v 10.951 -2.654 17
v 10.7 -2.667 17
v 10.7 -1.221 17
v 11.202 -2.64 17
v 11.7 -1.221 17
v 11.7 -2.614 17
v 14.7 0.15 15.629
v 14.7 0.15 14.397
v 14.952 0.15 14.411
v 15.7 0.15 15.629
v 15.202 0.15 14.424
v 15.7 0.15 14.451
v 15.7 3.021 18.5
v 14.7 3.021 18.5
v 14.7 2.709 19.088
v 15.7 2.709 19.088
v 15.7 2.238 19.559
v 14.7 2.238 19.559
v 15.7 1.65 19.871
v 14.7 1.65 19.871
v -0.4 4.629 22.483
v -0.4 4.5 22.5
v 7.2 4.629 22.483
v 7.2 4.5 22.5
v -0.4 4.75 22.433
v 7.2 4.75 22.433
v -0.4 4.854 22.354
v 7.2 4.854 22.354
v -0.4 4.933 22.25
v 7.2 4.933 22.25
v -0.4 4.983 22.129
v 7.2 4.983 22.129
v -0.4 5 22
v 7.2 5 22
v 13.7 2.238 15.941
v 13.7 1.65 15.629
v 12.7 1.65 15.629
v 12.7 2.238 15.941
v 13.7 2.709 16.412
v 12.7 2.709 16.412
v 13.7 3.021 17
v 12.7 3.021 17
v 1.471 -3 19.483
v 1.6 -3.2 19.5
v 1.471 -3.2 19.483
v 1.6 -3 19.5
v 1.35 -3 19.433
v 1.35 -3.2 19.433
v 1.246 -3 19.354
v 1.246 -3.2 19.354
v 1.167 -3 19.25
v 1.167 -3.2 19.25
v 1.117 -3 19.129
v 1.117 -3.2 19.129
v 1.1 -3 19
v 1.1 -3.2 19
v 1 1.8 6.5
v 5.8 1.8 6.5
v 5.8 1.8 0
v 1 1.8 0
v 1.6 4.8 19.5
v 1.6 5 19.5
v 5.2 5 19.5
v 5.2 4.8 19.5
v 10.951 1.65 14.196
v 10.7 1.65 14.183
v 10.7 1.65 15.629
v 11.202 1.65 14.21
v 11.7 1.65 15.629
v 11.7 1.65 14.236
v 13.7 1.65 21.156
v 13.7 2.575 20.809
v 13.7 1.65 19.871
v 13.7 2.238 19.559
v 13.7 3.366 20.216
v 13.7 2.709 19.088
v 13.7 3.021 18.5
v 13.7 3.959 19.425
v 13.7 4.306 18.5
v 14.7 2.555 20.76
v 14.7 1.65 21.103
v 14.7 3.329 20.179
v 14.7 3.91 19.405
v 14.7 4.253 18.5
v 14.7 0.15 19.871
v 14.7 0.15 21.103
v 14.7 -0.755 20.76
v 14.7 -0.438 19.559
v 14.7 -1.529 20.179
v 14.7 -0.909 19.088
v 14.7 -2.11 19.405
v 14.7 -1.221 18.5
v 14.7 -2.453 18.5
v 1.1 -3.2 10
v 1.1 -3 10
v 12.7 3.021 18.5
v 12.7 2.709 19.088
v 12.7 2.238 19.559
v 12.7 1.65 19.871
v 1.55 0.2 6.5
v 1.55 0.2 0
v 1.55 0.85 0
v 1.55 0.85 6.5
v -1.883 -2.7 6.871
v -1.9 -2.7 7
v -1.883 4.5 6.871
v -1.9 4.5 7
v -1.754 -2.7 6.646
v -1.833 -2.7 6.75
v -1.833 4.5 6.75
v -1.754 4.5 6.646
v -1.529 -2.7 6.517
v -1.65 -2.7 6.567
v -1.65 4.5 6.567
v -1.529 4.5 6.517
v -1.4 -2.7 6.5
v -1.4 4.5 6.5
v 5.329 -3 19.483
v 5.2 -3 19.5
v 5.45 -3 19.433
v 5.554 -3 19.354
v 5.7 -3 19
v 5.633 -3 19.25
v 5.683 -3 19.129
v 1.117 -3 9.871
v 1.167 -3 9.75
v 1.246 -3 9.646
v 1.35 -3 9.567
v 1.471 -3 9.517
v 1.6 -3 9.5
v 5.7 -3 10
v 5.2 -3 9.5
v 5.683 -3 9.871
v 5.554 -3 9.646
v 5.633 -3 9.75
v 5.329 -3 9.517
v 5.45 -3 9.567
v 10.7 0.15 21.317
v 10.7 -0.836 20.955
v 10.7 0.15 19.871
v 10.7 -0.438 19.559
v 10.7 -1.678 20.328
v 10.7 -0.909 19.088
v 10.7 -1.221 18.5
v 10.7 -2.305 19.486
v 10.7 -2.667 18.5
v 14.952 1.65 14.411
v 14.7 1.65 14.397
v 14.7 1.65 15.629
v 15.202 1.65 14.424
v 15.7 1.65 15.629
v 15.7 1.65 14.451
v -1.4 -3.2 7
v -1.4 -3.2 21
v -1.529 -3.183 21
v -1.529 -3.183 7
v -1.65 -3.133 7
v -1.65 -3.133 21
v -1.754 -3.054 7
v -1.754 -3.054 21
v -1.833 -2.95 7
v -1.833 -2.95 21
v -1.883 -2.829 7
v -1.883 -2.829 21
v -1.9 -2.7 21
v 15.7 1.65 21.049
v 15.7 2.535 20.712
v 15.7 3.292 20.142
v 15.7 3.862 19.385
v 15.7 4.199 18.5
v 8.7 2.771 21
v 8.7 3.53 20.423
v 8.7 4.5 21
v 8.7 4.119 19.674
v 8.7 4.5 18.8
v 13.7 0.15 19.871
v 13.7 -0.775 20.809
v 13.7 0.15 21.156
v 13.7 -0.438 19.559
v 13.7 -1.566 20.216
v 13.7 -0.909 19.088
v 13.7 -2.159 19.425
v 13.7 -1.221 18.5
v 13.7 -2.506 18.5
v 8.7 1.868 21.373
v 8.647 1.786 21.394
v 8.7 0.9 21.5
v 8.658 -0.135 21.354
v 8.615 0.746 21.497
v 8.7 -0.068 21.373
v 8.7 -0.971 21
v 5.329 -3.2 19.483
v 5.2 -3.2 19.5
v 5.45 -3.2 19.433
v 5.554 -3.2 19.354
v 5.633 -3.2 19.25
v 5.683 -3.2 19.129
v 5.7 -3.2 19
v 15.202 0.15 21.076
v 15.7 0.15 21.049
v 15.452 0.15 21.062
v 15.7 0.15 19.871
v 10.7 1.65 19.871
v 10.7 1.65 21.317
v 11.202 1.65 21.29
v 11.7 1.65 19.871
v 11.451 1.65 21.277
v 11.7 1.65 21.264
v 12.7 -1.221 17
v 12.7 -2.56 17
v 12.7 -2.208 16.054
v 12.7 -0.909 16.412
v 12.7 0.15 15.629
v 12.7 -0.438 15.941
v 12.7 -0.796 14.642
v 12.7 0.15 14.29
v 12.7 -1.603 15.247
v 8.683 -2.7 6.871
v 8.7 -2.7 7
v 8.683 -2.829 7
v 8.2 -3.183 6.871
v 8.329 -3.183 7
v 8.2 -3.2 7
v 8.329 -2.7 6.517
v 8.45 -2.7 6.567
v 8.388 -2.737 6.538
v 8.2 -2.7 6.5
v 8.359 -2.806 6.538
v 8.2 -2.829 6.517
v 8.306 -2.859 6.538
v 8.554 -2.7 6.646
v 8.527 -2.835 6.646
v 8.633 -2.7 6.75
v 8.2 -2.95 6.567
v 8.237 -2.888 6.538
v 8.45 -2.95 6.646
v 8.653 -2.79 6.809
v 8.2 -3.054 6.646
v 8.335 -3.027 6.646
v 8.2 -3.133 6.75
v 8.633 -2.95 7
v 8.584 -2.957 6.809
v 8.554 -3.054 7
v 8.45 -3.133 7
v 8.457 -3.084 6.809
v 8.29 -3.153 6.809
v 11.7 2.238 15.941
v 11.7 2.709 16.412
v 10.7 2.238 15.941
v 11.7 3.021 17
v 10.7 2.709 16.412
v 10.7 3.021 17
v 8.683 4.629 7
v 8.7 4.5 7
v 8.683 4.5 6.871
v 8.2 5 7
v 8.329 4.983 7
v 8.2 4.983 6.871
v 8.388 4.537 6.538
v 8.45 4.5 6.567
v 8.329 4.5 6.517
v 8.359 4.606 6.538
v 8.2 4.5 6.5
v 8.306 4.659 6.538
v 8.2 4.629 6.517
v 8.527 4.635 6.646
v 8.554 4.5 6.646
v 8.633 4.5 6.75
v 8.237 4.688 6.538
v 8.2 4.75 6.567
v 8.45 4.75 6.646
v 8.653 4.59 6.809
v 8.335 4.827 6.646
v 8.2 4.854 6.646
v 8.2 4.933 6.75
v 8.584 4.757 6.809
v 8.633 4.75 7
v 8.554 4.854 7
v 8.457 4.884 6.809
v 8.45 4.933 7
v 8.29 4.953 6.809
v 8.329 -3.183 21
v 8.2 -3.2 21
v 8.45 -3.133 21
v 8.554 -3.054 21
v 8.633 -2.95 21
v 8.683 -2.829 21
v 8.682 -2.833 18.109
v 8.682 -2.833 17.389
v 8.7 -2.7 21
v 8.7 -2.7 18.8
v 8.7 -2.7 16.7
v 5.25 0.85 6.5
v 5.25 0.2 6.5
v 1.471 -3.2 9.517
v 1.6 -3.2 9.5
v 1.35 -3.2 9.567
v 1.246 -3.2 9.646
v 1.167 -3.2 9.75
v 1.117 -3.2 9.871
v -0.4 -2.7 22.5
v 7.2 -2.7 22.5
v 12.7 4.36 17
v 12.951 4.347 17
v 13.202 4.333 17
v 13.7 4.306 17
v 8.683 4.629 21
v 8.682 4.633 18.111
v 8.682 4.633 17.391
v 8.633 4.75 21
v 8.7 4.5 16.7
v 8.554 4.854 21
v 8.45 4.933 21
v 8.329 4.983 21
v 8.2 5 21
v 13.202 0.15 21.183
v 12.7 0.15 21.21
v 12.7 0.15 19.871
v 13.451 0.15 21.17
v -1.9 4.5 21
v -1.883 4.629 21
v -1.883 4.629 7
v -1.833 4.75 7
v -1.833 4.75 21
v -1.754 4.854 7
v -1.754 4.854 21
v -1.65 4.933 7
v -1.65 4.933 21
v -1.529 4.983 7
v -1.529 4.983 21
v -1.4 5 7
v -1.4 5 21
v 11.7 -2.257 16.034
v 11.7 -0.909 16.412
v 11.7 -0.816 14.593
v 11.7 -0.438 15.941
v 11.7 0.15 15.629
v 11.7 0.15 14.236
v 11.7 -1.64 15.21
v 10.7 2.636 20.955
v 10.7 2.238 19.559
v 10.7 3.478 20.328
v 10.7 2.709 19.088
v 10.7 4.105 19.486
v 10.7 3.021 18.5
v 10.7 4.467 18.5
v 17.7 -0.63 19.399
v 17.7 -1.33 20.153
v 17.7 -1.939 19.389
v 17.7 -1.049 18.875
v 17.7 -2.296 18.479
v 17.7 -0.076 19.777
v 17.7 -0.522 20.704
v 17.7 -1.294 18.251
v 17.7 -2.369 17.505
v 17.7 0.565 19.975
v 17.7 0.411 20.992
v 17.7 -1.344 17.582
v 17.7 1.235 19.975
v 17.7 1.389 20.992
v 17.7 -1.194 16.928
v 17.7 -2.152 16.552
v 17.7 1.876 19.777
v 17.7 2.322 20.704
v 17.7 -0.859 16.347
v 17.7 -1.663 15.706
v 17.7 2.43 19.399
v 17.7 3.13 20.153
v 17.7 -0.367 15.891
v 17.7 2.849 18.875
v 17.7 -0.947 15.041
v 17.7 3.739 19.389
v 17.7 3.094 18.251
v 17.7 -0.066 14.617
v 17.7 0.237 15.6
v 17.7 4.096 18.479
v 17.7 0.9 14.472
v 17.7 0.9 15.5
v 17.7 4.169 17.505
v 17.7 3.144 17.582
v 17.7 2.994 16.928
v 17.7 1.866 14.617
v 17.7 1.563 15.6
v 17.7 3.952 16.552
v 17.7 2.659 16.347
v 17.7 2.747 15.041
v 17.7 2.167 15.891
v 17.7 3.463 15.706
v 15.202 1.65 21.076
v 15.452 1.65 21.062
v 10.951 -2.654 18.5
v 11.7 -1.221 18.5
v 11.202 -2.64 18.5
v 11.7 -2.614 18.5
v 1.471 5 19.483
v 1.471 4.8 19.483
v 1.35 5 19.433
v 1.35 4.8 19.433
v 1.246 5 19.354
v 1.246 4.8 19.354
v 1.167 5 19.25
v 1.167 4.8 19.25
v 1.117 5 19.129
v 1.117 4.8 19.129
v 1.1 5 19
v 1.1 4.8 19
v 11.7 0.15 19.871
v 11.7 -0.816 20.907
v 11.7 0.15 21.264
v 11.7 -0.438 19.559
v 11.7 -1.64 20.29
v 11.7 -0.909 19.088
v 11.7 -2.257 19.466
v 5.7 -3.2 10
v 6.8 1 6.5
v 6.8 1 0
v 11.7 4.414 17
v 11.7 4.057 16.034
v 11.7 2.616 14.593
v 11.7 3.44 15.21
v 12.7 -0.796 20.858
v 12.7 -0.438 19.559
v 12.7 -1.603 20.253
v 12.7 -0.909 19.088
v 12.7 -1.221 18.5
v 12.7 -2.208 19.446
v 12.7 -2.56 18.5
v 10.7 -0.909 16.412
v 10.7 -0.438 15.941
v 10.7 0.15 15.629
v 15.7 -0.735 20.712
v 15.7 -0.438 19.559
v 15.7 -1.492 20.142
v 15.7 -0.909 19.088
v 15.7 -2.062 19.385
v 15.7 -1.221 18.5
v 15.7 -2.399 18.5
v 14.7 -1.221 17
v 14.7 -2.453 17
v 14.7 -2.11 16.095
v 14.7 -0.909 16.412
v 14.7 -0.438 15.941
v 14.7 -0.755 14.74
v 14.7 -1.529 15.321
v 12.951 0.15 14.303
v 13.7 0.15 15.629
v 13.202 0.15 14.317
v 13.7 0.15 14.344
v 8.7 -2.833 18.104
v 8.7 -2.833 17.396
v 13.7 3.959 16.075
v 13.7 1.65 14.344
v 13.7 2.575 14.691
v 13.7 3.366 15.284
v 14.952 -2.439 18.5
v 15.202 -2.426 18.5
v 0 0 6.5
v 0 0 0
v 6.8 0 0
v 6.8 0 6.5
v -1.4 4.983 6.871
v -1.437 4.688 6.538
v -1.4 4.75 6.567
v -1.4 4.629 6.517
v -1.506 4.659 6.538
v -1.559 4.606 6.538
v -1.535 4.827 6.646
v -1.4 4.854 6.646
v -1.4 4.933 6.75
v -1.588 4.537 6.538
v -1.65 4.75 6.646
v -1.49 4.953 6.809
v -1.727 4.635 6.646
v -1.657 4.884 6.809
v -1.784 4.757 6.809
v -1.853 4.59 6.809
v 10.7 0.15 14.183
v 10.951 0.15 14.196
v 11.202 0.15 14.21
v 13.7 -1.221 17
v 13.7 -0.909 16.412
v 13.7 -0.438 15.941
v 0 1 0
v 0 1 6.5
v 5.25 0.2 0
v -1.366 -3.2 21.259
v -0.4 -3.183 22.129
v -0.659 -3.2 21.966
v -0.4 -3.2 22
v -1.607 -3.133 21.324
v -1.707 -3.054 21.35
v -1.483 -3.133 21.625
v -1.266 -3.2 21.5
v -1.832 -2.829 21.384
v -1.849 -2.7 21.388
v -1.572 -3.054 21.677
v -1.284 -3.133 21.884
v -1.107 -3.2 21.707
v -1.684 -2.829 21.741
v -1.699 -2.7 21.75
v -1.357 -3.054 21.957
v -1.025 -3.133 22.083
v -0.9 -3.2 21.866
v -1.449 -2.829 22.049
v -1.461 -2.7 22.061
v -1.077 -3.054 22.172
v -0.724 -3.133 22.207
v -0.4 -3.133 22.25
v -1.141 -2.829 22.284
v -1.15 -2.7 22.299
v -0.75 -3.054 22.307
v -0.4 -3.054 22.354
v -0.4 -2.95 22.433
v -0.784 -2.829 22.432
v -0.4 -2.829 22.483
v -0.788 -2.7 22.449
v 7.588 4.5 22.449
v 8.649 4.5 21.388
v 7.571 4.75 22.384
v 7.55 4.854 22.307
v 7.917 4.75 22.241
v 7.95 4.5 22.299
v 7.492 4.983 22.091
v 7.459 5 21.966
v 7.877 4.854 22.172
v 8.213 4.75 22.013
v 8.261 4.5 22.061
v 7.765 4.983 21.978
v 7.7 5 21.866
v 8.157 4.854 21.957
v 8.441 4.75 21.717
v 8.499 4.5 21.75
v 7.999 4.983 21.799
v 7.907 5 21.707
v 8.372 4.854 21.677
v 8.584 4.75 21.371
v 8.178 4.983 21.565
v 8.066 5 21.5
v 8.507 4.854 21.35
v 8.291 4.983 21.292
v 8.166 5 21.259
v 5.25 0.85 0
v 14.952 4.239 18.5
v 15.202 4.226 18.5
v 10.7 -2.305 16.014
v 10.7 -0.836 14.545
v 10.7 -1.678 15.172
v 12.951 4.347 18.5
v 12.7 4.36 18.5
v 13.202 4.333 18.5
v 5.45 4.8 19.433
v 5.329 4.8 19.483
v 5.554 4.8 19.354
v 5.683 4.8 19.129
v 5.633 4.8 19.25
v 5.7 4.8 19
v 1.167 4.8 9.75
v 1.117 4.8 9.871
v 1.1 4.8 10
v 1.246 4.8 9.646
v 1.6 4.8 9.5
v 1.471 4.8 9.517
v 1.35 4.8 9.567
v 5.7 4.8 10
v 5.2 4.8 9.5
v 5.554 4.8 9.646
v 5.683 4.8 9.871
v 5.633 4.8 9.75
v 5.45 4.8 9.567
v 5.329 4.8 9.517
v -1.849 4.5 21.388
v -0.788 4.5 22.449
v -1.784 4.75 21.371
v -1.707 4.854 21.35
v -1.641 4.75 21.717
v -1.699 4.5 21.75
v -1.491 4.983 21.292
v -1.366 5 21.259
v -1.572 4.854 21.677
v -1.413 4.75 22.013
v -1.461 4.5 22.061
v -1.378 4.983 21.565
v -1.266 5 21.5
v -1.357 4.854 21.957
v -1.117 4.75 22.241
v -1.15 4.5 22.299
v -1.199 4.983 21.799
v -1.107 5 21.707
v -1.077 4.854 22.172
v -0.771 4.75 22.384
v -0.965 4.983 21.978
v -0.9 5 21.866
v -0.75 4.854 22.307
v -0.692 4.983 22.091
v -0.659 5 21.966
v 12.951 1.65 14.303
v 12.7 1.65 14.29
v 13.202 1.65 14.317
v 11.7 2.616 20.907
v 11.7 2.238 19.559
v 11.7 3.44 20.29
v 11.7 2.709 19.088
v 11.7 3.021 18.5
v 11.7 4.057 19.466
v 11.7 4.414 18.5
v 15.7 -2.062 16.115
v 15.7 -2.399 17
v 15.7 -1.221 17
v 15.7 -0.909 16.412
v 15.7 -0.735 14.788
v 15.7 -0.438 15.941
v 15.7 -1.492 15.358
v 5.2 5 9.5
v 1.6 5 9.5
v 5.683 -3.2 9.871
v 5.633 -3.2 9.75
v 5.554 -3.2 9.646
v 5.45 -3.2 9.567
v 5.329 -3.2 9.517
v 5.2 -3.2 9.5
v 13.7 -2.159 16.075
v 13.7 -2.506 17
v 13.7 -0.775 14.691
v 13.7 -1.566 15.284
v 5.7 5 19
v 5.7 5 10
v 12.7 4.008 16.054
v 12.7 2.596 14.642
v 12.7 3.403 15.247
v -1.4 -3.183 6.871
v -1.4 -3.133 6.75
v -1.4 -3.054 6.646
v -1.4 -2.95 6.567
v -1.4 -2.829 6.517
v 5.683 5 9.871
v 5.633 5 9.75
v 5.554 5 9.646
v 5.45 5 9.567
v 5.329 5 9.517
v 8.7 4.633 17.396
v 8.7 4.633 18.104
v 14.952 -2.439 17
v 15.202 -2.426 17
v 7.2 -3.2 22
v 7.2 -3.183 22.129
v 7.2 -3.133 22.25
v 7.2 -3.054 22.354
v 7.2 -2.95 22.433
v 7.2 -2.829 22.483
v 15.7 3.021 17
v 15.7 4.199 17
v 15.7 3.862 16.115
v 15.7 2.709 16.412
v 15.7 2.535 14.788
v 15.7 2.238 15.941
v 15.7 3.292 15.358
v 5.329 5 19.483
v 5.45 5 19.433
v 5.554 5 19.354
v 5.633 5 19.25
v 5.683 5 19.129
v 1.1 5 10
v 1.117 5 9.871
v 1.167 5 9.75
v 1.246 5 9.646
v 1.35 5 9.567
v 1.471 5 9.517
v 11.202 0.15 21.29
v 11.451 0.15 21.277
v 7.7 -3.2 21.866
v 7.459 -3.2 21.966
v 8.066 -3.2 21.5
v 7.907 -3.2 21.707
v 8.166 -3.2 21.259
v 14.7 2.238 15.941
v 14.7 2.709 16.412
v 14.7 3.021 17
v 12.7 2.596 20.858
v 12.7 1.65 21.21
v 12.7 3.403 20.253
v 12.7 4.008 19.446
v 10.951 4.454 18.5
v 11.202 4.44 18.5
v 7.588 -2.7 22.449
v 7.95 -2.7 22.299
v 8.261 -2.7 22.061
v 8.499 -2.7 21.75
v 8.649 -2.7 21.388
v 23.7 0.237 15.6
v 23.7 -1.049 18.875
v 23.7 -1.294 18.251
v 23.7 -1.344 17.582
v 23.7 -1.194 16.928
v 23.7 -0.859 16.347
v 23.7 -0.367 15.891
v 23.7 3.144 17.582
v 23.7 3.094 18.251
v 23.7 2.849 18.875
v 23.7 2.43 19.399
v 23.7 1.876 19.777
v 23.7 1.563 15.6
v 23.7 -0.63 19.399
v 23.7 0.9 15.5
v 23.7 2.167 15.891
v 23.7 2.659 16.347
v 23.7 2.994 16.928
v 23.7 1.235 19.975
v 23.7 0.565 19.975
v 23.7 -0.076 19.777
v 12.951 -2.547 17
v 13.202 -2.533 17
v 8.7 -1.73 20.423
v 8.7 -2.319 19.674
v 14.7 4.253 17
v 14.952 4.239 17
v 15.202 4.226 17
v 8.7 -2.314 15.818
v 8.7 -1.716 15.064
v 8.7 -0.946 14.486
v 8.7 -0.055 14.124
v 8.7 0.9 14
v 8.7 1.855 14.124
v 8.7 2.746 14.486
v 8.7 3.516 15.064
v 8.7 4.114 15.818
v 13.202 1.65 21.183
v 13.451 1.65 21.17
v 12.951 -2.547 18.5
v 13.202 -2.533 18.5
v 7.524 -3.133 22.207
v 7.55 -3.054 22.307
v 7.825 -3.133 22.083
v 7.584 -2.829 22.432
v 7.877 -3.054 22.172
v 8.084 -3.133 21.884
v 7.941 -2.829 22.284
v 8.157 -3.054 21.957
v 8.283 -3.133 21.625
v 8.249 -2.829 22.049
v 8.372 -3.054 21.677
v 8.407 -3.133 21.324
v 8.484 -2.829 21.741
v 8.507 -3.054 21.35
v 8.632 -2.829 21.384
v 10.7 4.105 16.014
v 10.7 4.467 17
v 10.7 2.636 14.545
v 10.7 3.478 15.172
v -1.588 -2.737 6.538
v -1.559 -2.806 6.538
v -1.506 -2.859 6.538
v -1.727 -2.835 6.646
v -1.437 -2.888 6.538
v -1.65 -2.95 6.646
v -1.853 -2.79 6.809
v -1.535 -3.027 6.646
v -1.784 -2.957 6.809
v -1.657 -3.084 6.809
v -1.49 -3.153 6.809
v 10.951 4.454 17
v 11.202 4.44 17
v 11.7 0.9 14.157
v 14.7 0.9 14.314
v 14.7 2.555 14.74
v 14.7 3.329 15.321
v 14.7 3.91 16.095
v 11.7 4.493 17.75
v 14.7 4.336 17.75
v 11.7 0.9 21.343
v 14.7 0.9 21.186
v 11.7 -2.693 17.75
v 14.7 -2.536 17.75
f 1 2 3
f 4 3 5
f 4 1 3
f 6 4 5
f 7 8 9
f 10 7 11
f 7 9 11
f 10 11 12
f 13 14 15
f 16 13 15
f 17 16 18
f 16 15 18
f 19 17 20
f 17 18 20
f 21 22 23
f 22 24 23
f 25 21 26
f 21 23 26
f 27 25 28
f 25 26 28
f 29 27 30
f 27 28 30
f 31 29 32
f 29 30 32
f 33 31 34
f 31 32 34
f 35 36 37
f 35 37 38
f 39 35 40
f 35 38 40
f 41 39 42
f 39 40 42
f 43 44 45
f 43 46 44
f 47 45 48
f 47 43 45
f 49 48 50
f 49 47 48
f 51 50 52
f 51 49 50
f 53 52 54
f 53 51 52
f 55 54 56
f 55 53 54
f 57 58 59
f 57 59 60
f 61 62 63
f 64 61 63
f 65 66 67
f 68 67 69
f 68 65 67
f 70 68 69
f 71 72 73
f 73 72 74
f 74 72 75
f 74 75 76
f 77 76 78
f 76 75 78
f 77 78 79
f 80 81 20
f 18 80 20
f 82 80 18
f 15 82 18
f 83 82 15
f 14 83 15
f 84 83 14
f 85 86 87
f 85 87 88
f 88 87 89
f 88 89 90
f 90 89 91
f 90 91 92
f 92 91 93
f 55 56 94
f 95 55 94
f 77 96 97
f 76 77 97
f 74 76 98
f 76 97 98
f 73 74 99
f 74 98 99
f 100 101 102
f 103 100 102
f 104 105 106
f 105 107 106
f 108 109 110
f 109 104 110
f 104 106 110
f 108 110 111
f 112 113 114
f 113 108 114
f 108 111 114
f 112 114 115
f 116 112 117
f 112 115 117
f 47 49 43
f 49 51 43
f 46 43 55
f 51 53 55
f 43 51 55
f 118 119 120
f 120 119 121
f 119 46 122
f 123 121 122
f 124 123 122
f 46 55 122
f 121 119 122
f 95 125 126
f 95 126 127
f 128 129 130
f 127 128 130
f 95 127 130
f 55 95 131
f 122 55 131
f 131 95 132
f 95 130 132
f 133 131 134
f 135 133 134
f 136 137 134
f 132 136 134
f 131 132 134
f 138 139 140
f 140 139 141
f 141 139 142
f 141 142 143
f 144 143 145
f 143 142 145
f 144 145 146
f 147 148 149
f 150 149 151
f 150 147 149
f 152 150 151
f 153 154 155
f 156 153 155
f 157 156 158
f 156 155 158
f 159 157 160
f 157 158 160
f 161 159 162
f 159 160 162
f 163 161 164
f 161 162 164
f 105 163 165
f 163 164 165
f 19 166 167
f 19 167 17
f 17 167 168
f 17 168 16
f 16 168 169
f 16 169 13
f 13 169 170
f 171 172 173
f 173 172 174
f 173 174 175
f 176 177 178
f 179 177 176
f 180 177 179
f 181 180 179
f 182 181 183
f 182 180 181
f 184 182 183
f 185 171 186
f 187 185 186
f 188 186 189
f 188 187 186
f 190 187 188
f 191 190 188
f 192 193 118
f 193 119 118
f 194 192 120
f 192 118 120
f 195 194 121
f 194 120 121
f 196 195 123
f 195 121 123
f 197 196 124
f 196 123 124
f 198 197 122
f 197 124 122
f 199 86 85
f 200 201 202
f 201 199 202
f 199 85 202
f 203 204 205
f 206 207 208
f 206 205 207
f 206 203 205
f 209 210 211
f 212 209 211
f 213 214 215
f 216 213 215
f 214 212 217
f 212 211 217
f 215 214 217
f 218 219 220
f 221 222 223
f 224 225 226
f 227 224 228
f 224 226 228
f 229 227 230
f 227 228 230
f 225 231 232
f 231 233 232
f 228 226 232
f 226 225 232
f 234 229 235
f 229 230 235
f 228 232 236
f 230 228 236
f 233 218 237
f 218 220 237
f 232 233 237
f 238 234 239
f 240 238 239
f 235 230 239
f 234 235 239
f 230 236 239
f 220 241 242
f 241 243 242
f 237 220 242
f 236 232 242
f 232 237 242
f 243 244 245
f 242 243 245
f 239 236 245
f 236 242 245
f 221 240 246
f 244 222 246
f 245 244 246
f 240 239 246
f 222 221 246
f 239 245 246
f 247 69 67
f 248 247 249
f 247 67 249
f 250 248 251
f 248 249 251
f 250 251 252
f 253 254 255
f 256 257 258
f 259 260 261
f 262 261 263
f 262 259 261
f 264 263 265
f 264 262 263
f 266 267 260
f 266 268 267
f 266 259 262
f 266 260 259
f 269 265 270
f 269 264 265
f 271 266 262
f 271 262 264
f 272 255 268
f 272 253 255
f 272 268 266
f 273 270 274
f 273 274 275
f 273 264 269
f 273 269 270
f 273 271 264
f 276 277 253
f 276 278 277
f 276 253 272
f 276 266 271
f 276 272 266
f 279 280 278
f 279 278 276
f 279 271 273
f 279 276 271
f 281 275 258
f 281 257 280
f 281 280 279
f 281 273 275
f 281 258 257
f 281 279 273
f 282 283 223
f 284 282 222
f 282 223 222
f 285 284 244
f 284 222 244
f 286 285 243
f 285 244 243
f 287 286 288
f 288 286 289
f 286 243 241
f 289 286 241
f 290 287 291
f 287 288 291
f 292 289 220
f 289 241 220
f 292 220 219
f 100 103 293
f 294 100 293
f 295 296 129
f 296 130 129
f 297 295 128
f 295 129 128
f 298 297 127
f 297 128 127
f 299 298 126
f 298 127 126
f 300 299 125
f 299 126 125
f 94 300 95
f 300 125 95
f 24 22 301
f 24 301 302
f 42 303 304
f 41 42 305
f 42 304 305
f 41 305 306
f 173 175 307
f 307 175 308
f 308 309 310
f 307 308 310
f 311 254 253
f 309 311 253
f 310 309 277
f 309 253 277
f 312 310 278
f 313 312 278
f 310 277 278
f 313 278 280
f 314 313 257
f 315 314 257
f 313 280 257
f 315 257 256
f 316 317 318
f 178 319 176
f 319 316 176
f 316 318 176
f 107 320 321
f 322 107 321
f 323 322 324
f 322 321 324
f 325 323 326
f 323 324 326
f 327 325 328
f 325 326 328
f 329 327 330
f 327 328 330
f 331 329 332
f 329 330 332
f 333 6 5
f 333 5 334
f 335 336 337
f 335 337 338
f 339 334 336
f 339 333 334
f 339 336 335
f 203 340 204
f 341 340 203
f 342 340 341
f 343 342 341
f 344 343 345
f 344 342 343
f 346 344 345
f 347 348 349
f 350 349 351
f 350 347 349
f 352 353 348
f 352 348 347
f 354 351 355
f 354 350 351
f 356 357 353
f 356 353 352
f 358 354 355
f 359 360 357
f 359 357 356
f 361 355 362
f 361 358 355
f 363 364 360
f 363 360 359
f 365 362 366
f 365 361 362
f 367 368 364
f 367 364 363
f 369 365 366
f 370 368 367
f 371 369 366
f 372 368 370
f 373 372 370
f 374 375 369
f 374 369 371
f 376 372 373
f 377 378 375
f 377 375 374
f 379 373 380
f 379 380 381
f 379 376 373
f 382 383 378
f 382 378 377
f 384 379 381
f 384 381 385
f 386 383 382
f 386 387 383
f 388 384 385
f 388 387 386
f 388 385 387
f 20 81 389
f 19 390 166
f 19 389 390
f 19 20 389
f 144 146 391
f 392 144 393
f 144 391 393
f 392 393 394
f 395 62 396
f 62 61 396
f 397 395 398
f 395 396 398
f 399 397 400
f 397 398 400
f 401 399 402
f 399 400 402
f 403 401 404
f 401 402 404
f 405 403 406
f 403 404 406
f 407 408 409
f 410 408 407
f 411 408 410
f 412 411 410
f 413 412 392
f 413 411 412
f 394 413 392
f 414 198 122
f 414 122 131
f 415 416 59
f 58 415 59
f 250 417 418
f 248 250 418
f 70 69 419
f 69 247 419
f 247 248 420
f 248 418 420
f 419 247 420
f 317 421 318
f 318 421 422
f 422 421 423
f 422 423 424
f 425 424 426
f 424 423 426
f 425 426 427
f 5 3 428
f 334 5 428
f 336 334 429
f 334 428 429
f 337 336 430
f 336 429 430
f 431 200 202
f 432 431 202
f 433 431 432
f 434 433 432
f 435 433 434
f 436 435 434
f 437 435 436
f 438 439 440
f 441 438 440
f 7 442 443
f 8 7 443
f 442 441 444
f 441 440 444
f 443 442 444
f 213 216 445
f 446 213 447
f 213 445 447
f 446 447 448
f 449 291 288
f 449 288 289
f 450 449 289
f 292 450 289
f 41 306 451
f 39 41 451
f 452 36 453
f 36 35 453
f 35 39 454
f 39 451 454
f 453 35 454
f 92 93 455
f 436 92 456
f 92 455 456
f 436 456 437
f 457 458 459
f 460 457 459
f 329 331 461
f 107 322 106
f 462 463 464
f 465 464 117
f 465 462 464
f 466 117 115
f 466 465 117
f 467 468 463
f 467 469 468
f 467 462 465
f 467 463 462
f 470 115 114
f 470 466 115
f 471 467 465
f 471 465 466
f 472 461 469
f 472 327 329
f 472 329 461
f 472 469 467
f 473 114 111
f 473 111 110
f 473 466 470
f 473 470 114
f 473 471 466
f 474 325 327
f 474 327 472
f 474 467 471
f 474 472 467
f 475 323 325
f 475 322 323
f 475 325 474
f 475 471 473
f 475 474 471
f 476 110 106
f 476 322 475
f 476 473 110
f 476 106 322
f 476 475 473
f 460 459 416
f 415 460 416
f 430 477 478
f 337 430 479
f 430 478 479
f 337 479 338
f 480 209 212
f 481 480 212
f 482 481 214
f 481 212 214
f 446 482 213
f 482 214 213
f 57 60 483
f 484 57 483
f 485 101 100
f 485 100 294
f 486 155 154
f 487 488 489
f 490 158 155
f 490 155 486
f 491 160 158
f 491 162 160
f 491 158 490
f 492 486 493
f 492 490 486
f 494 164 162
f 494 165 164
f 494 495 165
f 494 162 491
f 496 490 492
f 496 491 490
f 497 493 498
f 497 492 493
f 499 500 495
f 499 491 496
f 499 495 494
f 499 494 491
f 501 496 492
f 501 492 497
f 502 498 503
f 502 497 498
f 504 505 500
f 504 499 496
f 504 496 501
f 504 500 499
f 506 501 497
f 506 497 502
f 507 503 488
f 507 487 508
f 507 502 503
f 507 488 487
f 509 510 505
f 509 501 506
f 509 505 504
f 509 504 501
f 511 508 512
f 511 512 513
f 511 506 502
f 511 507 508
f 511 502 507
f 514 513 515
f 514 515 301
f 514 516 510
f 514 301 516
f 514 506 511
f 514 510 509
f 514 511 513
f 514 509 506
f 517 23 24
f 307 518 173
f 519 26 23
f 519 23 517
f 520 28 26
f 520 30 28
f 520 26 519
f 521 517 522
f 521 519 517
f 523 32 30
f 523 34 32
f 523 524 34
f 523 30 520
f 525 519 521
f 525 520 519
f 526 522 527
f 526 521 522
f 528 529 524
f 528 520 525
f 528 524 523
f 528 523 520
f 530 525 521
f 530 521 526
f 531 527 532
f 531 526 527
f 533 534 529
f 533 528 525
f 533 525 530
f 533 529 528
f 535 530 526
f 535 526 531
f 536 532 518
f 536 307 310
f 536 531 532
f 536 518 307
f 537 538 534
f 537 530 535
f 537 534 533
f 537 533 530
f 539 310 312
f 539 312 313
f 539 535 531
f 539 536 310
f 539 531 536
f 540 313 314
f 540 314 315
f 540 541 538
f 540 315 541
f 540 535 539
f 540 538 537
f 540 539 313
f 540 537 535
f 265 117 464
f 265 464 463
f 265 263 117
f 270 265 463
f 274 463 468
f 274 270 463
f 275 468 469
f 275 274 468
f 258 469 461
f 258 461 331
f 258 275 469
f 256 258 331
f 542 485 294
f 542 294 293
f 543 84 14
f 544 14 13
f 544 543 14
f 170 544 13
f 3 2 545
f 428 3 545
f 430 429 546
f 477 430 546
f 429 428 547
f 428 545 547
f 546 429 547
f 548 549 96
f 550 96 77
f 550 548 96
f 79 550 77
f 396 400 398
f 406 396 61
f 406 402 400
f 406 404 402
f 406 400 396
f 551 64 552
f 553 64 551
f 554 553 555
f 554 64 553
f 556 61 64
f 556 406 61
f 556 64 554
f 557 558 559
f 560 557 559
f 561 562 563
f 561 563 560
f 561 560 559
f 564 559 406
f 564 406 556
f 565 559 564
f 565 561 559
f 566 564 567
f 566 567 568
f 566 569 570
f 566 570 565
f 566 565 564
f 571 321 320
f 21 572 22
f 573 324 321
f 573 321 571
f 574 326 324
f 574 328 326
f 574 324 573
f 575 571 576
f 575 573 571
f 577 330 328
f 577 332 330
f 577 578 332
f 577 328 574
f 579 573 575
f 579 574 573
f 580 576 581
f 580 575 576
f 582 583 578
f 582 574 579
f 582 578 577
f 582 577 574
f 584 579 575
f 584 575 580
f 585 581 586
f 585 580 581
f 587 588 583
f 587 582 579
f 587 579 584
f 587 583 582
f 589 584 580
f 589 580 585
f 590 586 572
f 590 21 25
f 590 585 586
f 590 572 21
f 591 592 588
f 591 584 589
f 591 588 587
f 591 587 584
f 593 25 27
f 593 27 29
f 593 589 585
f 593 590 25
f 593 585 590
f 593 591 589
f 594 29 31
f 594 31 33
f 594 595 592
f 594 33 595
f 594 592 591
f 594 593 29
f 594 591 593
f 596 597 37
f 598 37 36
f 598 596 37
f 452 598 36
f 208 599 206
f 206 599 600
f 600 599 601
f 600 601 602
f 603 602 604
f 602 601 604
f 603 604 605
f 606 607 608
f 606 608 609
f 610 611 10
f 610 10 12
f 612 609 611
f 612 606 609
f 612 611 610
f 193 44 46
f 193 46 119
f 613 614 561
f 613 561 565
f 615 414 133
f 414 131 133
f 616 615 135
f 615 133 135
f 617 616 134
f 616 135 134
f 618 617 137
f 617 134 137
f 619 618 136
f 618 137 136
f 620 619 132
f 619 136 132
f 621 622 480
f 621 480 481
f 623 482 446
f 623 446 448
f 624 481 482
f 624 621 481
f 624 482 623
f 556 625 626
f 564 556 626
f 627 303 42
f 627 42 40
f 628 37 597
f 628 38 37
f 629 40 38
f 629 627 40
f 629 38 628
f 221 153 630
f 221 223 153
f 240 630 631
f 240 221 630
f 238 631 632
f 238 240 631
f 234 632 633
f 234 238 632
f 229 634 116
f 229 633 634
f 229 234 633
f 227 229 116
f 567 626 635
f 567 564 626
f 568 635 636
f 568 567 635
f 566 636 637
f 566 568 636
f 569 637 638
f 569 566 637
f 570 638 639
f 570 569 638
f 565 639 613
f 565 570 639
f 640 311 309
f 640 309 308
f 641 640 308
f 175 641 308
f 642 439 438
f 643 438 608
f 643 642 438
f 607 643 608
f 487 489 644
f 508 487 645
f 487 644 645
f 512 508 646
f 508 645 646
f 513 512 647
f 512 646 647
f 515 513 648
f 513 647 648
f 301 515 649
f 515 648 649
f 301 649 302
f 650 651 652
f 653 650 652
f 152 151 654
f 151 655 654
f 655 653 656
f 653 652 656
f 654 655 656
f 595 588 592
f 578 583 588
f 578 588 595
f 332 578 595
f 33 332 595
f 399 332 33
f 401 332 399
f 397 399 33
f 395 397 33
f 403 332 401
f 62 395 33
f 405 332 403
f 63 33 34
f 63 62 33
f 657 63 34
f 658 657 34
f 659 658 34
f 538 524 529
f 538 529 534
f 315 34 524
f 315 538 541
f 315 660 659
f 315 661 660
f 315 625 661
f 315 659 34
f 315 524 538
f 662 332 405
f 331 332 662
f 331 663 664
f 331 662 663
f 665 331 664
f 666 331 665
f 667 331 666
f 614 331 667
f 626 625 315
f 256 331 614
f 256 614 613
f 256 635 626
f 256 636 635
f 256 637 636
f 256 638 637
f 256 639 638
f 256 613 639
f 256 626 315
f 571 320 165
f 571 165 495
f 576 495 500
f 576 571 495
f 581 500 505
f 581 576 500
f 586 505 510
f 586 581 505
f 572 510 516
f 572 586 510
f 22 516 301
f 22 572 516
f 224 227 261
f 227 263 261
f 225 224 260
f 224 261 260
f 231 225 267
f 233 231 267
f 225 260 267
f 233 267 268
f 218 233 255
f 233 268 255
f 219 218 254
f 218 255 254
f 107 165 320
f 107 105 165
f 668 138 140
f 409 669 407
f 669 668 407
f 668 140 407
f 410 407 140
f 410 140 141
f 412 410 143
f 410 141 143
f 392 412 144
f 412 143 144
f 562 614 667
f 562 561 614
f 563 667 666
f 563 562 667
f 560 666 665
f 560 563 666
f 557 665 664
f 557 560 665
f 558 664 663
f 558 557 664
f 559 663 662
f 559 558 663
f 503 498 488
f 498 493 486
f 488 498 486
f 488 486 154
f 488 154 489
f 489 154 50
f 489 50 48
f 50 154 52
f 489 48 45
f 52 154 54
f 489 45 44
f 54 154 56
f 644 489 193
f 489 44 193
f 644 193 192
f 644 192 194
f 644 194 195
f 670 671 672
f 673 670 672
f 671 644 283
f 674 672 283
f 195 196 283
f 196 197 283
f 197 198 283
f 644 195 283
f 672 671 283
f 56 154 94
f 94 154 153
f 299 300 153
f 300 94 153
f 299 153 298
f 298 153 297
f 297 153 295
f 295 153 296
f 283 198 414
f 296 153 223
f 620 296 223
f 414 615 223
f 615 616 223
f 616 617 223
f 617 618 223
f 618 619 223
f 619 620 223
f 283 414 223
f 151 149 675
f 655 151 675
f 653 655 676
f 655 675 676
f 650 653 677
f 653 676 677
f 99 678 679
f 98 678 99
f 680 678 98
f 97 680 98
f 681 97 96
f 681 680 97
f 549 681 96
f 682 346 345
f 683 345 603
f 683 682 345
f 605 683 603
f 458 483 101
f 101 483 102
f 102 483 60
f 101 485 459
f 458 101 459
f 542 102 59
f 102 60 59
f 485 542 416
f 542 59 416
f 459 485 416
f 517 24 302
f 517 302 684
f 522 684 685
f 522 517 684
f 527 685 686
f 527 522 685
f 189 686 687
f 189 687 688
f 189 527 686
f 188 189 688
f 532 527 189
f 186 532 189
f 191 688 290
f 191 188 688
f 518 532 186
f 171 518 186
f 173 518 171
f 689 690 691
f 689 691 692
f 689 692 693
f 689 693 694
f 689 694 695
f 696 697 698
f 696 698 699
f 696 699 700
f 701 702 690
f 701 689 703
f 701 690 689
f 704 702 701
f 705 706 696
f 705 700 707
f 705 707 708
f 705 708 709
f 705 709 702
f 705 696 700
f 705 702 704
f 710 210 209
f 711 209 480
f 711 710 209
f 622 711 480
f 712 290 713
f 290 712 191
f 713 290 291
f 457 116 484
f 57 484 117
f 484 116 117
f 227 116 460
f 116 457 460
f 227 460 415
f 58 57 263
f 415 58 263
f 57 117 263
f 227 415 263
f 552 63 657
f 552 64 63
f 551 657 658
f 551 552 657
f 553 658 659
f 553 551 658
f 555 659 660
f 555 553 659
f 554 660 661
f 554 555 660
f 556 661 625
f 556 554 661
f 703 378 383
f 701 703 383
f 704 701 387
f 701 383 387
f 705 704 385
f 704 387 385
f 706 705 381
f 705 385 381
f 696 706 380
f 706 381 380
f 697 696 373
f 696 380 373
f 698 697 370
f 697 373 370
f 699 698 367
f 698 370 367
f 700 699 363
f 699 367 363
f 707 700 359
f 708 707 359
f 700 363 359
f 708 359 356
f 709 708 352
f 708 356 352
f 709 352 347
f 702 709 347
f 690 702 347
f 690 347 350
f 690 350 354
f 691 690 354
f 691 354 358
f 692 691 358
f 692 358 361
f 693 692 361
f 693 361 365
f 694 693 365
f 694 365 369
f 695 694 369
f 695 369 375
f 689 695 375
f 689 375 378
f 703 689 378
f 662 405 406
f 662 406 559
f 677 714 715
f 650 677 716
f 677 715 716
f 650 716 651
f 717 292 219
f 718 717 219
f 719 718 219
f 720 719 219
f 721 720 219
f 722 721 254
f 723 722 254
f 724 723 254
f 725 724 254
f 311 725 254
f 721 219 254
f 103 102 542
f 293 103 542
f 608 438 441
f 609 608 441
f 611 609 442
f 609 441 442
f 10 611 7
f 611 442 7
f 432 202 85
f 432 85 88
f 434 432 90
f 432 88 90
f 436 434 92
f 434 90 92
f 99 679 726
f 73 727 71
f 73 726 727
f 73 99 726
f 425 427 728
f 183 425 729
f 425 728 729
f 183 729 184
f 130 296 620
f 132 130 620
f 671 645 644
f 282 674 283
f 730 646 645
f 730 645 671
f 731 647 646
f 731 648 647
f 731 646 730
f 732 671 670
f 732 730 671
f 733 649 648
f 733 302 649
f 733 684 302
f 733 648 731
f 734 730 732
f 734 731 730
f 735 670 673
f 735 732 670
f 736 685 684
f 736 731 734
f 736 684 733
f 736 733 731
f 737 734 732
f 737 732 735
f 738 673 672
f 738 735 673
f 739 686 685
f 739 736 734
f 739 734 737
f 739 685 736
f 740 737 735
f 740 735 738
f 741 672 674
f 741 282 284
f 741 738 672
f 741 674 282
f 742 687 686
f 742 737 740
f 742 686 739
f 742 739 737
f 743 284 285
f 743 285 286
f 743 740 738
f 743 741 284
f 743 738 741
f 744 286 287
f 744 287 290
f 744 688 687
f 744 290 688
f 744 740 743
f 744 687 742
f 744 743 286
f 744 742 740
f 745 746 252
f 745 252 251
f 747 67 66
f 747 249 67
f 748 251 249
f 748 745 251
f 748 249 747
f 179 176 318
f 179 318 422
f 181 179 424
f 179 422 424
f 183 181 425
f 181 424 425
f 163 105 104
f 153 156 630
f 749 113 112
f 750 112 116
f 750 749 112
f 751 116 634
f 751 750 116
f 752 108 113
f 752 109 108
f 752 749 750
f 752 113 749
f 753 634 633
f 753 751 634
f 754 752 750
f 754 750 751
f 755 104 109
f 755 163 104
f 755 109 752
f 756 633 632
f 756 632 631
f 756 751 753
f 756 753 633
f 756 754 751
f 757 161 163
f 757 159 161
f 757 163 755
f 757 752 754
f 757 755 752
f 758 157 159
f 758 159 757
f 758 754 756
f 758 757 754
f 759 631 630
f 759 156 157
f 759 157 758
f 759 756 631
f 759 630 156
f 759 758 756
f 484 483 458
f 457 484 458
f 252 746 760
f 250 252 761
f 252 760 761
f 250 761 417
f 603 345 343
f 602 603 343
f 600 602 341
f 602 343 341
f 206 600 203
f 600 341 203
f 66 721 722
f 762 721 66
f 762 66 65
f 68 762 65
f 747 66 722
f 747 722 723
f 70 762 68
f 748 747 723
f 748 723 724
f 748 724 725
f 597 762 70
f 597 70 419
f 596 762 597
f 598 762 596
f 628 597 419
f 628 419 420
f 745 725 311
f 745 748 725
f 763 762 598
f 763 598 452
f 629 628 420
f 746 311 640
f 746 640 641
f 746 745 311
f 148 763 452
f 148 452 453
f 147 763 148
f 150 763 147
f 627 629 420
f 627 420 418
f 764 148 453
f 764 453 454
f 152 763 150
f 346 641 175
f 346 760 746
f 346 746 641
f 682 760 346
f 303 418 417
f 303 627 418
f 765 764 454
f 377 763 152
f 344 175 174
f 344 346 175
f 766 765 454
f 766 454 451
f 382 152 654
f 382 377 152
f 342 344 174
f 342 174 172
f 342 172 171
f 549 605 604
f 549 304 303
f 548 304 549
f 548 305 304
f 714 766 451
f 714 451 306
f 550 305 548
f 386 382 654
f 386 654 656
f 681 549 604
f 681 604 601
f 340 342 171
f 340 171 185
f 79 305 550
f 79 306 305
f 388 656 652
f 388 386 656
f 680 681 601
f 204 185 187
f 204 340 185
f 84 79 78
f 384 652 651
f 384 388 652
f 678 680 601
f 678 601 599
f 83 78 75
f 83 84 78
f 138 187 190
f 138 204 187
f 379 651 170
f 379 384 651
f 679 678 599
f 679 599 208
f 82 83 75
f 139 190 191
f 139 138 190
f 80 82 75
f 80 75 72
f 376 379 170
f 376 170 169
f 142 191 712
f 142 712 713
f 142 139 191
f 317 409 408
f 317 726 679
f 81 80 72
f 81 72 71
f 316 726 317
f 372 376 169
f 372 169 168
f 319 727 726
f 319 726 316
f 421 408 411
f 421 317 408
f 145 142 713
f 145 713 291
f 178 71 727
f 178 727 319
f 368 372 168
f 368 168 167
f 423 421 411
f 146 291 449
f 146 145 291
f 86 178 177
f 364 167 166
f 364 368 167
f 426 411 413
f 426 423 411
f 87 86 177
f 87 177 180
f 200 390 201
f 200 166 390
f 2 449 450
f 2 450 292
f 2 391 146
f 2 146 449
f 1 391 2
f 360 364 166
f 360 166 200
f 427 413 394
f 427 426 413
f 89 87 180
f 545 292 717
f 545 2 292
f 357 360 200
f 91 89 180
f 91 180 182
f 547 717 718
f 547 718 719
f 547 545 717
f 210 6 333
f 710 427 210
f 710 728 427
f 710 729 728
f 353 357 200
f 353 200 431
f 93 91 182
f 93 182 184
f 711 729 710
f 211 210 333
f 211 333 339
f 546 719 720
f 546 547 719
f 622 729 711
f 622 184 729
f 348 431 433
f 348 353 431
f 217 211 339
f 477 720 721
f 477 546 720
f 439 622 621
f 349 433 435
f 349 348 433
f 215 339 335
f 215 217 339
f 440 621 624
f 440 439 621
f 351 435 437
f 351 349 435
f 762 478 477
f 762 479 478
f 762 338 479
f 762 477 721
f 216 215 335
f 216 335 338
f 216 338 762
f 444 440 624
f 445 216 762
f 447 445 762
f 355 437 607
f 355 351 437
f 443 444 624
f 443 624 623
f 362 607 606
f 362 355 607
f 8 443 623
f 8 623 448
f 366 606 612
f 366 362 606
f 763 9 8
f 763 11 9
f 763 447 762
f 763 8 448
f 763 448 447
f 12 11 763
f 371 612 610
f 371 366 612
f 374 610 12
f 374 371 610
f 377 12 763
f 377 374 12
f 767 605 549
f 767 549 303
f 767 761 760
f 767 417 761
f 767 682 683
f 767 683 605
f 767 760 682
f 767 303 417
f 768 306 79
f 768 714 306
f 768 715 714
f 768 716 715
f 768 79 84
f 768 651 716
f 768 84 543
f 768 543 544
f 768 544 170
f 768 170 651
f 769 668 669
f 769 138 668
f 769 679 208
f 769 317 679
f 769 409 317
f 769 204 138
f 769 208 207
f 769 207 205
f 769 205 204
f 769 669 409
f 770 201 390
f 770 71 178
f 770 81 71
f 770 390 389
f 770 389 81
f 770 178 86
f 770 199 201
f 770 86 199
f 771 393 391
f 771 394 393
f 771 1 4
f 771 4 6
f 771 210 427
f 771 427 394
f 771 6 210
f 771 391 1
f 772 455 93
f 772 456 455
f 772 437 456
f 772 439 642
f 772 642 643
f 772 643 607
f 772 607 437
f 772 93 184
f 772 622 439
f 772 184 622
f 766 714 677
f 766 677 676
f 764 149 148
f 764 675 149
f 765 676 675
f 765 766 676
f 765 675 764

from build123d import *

# Parameters (mm, degrees)
SKETCH1_W                     = 3.7
SKETCH1_H                     = 0.65
BOSS_EXTRUDE1_DEPTH           = 6.5
SKETCH2_W                     = 10.6
SKETCH2_H                     = 8.2
BOSS_EXTRUDE2_DEPTH           = 16
SKETCH6_W                     = 4.6
SKETCH6_H                     = 10
CUT_EXTRUDE2_DEPTH            = 0.2
FILLET3_R                     = 0.5
FILLET3_OF_MIRROR2_R          = 0.5
FILLET1_R                     = 1.5
FILLET2_R                     = 0.5
SKETCH3_R                     = 3.75
BOSS_EXTRUDE3_DEPTH           = 9
BOSS_EXTRUDE3_TAPER           = 3
BOSS_EXTRUDE3_OTHER_WAY_DEPTH = 8.7
SKETCH5_W                     = 1
SKETCH5_H                     = 2.895184441
CUT_EXTRUDE1_DEPTH            = 3.35
SKETCH4_R                     = 2.25
BOSS_EXTRUDE4_DEPTH           = 15


with BuildPart() as part:
    # Sketch1 → Boss-Extrude1 (new body)
    with BuildSketch(Plane.XY):
        Polygon((1, 1.8), (0, 1), (0, 0), (6.8, 0), (6.8, 1), (5.8, 1.8), align=None)
        with Locations((3.4, 0.525)):
            Rectangle(SKETCH1_W, SKETCH1_H, mode=Mode.SUBTRACT)
    extrude(amount=BOSS_EXTRUDE1_DEPTH)

    # Sketch2 → Boss-Extrude2 (add)
    with BuildSketch(Plane.XY.offset(6.5)):
        with Locations((3.4, 0.9)):
            Rectangle(SKETCH2_W, SKETCH2_H)
    extrude(amount=BOSS_EXTRUDE2_DEPTH)

    # Sketch6 → Cut-Extrude2 (cut)
    with BuildSketch(Plane(origin=(0, 5, 0), x_dir=(1, 0, 0), z_dir=(0, 1, 0))):
        with Locations((3.4, -14.5)):
            Rectangle(SKETCH6_W, SKETCH6_H)
    cut_extrude2 = extrude(amount=-CUT_EXTRUDE2_DEPTH, mode=Mode.SUBTRACT)

    # Fillet3
    fillet3_edges = [part.edges().sort_by_distance(p)[0] for p in [
        (5.7, 4.9, 9.5),
        (5.7, 4.9, 19.5),
        (1.1, 4.9, 19.5),
        (1.1, 4.9, 9.5),
    ]]
    fillet(fillet3_edges, radius=FILLET3_R)

    # Mirror2: Cut-Extrude2 across plane
    add(cut_extrude2.mirror(Plane.ZX.offset(0.9)), mode=Mode.SUBTRACT)

    # Fillet3 of Mirror2
    fillet3_of_mirror2_edges = [part.edges().sort_by_distance(p)[0] for p in [
        (5.7, -3.1, 9.5),
        (5.7, -3.1, 19.5),
        (1.1, -3.1, 19.5),
        (1.1, -3.1, 9.5),
    ]]
    fillet(fillet3_of_mirror2_edges, radius=FILLET3_OF_MIRROR2_R)

    # Fillet1
    fillet1_edges = [part.edges().sort_by_distance(p)[0] for p in [
        (8.7, 0.9, 22.5),
        (-1.9, 0.9, 22.5),
    ]]
    fillet(fillet1_edges, radius=FILLET1_R)

    # Fillet2
    fillet2_edges = [part.edges().sort_by_distance(p)[0] for p in [
        (3.4, 5, 22.5),
        (3.4, -3.2, 22.5),
        (8.7, -3.2, 13.75),
        (-1.9, -3.2, 13.75),
        (8.260660172, -3.2, 22.060660172),
        (-1.460660172, -3.2, 22.060660172),
        (-1.9, 5, 13.75),
        (8.7, 5, 13.75),
        (8.260660172, 5, 22.060660172),
        (-1.460660172, 5, 22.060660172),
        (8.7, 0.9, 6.5),
        (3.4, 5, 6.5),
        (-1.9, 0.9, 6.5),
        (3.4, -3.2, 6.5),
    ]]
    fillet(fillet2_edges, radius=FILLET2_R)

    # Sketch3 → Boss-Extrude3 (add)
    with BuildSketch(Plane(origin=(8.7, 0, 0), x_dir=(0, 0, -1), z_dir=(1, 0, 0))):
        with Locations((-17.75, 0.9)):
            Circle(SKETCH3_R)
    extrude(amount=BOSS_EXTRUDE3_DEPTH, taper=BOSS_EXTRUDE3_TAPER)

    # Sketch3 → Boss-Extrude3 other way (add)
    with BuildSketch(Plane(origin=(8.7, 0, 0), x_dir=(0, 0, -1), z_dir=(1, 0, 0))):
        with Locations((-17.75, 0.9)):
            Circle(SKETCH3_R)
    extrude(amount=-BOSS_EXTRUDE3_OTHER_WAY_DEPTH)

    # Sketch5 → Cut-Extrude1 (cut)
    with BuildSketch(Plane(origin=(0, 5, 0), x_dir=(1, 0, 0), z_dir=(0, 1, 0))):
        with Locations((11.2, -15.55240778)):
            Rectangle(SKETCH5_W, SKETCH5_H)
        with Locations((13.2, -15.55240778)):
            Rectangle(SKETCH5_W, SKETCH5_H)
        with Locations((15.2, -15.55240778)):
            Rectangle(SKETCH5_W, SKETCH5_H)
        with Locations((11.2, -19.94759222)):
            Rectangle(SKETCH5_W, SKETCH5_H)
        with Locations((13.2, -19.94759222)):
            Rectangle(SKETCH5_W, SKETCH5_H)
        with Locations((15.2, -19.94759222)):
            Rectangle(SKETCH5_W, SKETCH5_H)
    cut_extrude1 = extrude(amount=-CUT_EXTRUDE1_DEPTH, mode=Mode.SUBTRACT)

    # Mirror1: Cut-Extrude1 across plane
    add(cut_extrude1.mirror(Plane.ZX.offset(0.9)), mode=Mode.SUBTRACT)

    # Sketch4 → Boss-Extrude4 (add)
    with BuildSketch(Plane(origin=(8.7, 0, 0), x_dir=(0, 0, -1), z_dir=(1, 0, 0))):
        with Locations((-17.75, 0.9)):
            Circle(SKETCH4_R)
    extrude(amount=BOSS_EXTRUDE4_DEPTH)


solid = part.part
